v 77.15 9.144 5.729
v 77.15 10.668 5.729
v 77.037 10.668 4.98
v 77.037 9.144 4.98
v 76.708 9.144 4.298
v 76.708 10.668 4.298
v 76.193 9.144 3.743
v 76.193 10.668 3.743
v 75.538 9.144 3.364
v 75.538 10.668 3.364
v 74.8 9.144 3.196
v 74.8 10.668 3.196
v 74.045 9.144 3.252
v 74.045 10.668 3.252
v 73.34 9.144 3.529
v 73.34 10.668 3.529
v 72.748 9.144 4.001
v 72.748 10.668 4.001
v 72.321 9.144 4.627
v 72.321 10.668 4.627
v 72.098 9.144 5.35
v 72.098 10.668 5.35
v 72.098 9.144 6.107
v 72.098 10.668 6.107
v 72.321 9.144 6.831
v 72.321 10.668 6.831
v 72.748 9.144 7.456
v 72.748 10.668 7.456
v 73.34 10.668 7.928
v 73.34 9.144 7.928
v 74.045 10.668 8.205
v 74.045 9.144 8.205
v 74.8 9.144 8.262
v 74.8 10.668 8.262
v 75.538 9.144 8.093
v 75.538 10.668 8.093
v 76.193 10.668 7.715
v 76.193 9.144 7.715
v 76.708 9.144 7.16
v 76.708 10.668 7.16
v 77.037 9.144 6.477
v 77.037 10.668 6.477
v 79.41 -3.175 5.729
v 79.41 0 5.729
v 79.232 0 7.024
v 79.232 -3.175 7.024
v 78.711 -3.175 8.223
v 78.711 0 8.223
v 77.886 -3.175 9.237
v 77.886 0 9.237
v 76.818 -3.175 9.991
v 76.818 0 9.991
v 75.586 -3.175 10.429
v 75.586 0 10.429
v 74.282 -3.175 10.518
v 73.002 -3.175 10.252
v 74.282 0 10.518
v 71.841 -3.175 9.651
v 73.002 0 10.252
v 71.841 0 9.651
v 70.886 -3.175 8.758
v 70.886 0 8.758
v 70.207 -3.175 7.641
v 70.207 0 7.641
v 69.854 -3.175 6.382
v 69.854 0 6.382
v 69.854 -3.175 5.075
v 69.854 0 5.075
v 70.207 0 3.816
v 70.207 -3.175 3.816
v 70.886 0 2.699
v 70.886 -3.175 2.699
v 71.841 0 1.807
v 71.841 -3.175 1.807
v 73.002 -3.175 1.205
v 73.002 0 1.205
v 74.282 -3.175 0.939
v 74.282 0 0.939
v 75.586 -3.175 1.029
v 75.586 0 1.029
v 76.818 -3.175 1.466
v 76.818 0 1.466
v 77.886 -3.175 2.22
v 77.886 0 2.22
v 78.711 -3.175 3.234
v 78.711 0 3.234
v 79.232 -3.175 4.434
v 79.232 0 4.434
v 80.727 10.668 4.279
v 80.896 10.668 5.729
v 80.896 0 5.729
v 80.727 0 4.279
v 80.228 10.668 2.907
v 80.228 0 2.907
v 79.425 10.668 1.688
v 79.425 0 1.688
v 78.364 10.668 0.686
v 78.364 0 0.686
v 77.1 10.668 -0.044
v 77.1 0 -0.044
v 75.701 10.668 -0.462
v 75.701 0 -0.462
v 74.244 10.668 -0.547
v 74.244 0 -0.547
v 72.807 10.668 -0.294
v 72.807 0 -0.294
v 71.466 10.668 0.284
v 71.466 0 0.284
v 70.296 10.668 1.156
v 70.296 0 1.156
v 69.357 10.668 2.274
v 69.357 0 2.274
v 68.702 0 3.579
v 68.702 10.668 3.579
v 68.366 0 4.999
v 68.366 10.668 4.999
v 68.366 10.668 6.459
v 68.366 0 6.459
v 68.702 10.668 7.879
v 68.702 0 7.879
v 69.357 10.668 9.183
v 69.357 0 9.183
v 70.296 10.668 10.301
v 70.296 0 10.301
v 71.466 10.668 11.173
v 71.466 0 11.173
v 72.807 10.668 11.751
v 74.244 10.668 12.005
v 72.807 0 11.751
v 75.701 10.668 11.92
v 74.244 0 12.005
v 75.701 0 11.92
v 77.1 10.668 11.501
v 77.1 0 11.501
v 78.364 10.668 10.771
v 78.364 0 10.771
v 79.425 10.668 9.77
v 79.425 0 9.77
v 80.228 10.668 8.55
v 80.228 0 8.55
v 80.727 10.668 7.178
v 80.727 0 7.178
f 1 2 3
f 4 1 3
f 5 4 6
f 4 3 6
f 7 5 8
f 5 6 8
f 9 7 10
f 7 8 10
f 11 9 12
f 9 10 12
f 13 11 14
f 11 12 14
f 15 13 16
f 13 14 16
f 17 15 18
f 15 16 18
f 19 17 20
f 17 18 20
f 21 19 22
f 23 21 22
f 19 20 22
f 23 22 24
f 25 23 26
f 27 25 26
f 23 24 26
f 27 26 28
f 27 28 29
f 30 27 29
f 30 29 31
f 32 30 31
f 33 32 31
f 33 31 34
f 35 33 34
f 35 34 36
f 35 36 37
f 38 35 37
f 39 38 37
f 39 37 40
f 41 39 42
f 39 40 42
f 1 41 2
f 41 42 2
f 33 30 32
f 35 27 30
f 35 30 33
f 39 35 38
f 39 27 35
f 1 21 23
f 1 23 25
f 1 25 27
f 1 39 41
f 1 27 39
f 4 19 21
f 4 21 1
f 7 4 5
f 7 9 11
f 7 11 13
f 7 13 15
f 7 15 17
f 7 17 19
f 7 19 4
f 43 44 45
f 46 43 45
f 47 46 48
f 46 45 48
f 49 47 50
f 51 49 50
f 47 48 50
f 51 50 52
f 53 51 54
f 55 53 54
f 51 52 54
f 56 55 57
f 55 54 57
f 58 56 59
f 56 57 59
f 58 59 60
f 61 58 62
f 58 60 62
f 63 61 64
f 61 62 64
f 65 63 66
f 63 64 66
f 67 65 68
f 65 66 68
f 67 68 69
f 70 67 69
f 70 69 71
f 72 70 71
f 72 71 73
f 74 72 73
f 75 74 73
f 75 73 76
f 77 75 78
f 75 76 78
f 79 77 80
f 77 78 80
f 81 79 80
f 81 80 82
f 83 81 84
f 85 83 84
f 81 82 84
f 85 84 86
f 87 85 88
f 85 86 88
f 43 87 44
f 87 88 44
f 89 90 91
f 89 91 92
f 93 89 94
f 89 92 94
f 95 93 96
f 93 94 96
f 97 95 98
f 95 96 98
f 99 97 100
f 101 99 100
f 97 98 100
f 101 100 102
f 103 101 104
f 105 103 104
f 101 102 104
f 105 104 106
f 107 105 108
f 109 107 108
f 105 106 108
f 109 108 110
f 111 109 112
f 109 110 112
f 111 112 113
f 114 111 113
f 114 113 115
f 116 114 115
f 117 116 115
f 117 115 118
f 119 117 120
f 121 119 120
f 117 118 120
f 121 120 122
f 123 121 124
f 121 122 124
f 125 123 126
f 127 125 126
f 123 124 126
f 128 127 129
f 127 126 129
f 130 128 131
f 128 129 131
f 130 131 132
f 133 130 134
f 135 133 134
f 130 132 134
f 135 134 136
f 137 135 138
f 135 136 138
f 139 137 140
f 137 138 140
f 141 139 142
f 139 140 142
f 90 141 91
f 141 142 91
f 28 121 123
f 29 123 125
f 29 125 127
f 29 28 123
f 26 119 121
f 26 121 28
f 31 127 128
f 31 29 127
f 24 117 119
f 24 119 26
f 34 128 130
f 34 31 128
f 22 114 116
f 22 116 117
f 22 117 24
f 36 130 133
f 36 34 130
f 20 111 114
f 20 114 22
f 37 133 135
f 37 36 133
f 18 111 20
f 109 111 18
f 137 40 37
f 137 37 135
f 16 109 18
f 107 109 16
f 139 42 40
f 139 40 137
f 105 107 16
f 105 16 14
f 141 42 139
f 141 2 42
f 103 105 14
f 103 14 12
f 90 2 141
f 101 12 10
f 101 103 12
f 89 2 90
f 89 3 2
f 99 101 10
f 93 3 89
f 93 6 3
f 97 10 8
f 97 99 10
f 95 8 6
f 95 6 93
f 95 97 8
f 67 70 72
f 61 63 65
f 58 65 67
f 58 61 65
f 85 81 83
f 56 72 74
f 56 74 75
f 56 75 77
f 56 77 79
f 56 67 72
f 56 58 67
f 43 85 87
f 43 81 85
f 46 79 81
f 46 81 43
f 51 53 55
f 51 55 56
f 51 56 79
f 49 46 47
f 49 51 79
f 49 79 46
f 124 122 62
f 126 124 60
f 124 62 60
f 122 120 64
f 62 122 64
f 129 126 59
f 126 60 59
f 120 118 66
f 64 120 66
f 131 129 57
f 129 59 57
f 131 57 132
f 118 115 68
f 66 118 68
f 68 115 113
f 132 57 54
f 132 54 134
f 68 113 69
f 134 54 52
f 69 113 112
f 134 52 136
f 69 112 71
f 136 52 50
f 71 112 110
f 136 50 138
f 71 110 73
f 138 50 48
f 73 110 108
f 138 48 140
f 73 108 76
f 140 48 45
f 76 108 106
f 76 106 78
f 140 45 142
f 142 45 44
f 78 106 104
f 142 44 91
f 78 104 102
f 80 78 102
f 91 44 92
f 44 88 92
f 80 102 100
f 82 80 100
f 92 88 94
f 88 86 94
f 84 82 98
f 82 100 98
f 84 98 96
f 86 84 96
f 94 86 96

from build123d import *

# Parameters (mm, degrees)
SKETCH015_R             = 4.8006
PAD008_DEPTH            = 3.175
SKETCH016_R             = 6.2865
PAD009_DEPTH            = 10.668
SKETCH017_R             = 2.54
POCKET006_DEPTH         = 1.524
BODY002_PLACEMENT_ANGLE = 90


with BuildPart() as part:
    # Sketch015 → Pad008 (new body)
    with BuildSketch(Plane.XY):
        Circle(SKETCH015_R)
    extrude(amount=PAD008_DEPTH)

    # Sketch016 (on Face2 of Pad008) → Pad009 (join)
    with BuildSketch(Plane(origin=(0, 0, 0), x_dir=(1, 0, 0), z_dir=(0, 0, -1))):
        Circle(SKETCH016_R)
    extrude(amount=PAD009_DEPTH)

    # Sketch017 (on Face3 of Pad009) → Pocket006 (cut)
    with BuildSketch(Plane(origin=(0, 0, -10.668), x_dir=(1, 0, 0), z_dir=(0, 0, -1))):
        Circle(SKETCH017_R)
    extrude(amount=-POCKET006_DEPTH, mode=Mode.SUBTRACT)


with BuildPart() as part_1:
    # Body002 placement: moved
    add(part.part.moved(Location((74.609706, 0, 5.728716))).rotate(Axis((74.609706, 0, 5.728716), (1, 0, 0)), BODY002_PLACEMENT_ANGLE))


solid = part_1.part
